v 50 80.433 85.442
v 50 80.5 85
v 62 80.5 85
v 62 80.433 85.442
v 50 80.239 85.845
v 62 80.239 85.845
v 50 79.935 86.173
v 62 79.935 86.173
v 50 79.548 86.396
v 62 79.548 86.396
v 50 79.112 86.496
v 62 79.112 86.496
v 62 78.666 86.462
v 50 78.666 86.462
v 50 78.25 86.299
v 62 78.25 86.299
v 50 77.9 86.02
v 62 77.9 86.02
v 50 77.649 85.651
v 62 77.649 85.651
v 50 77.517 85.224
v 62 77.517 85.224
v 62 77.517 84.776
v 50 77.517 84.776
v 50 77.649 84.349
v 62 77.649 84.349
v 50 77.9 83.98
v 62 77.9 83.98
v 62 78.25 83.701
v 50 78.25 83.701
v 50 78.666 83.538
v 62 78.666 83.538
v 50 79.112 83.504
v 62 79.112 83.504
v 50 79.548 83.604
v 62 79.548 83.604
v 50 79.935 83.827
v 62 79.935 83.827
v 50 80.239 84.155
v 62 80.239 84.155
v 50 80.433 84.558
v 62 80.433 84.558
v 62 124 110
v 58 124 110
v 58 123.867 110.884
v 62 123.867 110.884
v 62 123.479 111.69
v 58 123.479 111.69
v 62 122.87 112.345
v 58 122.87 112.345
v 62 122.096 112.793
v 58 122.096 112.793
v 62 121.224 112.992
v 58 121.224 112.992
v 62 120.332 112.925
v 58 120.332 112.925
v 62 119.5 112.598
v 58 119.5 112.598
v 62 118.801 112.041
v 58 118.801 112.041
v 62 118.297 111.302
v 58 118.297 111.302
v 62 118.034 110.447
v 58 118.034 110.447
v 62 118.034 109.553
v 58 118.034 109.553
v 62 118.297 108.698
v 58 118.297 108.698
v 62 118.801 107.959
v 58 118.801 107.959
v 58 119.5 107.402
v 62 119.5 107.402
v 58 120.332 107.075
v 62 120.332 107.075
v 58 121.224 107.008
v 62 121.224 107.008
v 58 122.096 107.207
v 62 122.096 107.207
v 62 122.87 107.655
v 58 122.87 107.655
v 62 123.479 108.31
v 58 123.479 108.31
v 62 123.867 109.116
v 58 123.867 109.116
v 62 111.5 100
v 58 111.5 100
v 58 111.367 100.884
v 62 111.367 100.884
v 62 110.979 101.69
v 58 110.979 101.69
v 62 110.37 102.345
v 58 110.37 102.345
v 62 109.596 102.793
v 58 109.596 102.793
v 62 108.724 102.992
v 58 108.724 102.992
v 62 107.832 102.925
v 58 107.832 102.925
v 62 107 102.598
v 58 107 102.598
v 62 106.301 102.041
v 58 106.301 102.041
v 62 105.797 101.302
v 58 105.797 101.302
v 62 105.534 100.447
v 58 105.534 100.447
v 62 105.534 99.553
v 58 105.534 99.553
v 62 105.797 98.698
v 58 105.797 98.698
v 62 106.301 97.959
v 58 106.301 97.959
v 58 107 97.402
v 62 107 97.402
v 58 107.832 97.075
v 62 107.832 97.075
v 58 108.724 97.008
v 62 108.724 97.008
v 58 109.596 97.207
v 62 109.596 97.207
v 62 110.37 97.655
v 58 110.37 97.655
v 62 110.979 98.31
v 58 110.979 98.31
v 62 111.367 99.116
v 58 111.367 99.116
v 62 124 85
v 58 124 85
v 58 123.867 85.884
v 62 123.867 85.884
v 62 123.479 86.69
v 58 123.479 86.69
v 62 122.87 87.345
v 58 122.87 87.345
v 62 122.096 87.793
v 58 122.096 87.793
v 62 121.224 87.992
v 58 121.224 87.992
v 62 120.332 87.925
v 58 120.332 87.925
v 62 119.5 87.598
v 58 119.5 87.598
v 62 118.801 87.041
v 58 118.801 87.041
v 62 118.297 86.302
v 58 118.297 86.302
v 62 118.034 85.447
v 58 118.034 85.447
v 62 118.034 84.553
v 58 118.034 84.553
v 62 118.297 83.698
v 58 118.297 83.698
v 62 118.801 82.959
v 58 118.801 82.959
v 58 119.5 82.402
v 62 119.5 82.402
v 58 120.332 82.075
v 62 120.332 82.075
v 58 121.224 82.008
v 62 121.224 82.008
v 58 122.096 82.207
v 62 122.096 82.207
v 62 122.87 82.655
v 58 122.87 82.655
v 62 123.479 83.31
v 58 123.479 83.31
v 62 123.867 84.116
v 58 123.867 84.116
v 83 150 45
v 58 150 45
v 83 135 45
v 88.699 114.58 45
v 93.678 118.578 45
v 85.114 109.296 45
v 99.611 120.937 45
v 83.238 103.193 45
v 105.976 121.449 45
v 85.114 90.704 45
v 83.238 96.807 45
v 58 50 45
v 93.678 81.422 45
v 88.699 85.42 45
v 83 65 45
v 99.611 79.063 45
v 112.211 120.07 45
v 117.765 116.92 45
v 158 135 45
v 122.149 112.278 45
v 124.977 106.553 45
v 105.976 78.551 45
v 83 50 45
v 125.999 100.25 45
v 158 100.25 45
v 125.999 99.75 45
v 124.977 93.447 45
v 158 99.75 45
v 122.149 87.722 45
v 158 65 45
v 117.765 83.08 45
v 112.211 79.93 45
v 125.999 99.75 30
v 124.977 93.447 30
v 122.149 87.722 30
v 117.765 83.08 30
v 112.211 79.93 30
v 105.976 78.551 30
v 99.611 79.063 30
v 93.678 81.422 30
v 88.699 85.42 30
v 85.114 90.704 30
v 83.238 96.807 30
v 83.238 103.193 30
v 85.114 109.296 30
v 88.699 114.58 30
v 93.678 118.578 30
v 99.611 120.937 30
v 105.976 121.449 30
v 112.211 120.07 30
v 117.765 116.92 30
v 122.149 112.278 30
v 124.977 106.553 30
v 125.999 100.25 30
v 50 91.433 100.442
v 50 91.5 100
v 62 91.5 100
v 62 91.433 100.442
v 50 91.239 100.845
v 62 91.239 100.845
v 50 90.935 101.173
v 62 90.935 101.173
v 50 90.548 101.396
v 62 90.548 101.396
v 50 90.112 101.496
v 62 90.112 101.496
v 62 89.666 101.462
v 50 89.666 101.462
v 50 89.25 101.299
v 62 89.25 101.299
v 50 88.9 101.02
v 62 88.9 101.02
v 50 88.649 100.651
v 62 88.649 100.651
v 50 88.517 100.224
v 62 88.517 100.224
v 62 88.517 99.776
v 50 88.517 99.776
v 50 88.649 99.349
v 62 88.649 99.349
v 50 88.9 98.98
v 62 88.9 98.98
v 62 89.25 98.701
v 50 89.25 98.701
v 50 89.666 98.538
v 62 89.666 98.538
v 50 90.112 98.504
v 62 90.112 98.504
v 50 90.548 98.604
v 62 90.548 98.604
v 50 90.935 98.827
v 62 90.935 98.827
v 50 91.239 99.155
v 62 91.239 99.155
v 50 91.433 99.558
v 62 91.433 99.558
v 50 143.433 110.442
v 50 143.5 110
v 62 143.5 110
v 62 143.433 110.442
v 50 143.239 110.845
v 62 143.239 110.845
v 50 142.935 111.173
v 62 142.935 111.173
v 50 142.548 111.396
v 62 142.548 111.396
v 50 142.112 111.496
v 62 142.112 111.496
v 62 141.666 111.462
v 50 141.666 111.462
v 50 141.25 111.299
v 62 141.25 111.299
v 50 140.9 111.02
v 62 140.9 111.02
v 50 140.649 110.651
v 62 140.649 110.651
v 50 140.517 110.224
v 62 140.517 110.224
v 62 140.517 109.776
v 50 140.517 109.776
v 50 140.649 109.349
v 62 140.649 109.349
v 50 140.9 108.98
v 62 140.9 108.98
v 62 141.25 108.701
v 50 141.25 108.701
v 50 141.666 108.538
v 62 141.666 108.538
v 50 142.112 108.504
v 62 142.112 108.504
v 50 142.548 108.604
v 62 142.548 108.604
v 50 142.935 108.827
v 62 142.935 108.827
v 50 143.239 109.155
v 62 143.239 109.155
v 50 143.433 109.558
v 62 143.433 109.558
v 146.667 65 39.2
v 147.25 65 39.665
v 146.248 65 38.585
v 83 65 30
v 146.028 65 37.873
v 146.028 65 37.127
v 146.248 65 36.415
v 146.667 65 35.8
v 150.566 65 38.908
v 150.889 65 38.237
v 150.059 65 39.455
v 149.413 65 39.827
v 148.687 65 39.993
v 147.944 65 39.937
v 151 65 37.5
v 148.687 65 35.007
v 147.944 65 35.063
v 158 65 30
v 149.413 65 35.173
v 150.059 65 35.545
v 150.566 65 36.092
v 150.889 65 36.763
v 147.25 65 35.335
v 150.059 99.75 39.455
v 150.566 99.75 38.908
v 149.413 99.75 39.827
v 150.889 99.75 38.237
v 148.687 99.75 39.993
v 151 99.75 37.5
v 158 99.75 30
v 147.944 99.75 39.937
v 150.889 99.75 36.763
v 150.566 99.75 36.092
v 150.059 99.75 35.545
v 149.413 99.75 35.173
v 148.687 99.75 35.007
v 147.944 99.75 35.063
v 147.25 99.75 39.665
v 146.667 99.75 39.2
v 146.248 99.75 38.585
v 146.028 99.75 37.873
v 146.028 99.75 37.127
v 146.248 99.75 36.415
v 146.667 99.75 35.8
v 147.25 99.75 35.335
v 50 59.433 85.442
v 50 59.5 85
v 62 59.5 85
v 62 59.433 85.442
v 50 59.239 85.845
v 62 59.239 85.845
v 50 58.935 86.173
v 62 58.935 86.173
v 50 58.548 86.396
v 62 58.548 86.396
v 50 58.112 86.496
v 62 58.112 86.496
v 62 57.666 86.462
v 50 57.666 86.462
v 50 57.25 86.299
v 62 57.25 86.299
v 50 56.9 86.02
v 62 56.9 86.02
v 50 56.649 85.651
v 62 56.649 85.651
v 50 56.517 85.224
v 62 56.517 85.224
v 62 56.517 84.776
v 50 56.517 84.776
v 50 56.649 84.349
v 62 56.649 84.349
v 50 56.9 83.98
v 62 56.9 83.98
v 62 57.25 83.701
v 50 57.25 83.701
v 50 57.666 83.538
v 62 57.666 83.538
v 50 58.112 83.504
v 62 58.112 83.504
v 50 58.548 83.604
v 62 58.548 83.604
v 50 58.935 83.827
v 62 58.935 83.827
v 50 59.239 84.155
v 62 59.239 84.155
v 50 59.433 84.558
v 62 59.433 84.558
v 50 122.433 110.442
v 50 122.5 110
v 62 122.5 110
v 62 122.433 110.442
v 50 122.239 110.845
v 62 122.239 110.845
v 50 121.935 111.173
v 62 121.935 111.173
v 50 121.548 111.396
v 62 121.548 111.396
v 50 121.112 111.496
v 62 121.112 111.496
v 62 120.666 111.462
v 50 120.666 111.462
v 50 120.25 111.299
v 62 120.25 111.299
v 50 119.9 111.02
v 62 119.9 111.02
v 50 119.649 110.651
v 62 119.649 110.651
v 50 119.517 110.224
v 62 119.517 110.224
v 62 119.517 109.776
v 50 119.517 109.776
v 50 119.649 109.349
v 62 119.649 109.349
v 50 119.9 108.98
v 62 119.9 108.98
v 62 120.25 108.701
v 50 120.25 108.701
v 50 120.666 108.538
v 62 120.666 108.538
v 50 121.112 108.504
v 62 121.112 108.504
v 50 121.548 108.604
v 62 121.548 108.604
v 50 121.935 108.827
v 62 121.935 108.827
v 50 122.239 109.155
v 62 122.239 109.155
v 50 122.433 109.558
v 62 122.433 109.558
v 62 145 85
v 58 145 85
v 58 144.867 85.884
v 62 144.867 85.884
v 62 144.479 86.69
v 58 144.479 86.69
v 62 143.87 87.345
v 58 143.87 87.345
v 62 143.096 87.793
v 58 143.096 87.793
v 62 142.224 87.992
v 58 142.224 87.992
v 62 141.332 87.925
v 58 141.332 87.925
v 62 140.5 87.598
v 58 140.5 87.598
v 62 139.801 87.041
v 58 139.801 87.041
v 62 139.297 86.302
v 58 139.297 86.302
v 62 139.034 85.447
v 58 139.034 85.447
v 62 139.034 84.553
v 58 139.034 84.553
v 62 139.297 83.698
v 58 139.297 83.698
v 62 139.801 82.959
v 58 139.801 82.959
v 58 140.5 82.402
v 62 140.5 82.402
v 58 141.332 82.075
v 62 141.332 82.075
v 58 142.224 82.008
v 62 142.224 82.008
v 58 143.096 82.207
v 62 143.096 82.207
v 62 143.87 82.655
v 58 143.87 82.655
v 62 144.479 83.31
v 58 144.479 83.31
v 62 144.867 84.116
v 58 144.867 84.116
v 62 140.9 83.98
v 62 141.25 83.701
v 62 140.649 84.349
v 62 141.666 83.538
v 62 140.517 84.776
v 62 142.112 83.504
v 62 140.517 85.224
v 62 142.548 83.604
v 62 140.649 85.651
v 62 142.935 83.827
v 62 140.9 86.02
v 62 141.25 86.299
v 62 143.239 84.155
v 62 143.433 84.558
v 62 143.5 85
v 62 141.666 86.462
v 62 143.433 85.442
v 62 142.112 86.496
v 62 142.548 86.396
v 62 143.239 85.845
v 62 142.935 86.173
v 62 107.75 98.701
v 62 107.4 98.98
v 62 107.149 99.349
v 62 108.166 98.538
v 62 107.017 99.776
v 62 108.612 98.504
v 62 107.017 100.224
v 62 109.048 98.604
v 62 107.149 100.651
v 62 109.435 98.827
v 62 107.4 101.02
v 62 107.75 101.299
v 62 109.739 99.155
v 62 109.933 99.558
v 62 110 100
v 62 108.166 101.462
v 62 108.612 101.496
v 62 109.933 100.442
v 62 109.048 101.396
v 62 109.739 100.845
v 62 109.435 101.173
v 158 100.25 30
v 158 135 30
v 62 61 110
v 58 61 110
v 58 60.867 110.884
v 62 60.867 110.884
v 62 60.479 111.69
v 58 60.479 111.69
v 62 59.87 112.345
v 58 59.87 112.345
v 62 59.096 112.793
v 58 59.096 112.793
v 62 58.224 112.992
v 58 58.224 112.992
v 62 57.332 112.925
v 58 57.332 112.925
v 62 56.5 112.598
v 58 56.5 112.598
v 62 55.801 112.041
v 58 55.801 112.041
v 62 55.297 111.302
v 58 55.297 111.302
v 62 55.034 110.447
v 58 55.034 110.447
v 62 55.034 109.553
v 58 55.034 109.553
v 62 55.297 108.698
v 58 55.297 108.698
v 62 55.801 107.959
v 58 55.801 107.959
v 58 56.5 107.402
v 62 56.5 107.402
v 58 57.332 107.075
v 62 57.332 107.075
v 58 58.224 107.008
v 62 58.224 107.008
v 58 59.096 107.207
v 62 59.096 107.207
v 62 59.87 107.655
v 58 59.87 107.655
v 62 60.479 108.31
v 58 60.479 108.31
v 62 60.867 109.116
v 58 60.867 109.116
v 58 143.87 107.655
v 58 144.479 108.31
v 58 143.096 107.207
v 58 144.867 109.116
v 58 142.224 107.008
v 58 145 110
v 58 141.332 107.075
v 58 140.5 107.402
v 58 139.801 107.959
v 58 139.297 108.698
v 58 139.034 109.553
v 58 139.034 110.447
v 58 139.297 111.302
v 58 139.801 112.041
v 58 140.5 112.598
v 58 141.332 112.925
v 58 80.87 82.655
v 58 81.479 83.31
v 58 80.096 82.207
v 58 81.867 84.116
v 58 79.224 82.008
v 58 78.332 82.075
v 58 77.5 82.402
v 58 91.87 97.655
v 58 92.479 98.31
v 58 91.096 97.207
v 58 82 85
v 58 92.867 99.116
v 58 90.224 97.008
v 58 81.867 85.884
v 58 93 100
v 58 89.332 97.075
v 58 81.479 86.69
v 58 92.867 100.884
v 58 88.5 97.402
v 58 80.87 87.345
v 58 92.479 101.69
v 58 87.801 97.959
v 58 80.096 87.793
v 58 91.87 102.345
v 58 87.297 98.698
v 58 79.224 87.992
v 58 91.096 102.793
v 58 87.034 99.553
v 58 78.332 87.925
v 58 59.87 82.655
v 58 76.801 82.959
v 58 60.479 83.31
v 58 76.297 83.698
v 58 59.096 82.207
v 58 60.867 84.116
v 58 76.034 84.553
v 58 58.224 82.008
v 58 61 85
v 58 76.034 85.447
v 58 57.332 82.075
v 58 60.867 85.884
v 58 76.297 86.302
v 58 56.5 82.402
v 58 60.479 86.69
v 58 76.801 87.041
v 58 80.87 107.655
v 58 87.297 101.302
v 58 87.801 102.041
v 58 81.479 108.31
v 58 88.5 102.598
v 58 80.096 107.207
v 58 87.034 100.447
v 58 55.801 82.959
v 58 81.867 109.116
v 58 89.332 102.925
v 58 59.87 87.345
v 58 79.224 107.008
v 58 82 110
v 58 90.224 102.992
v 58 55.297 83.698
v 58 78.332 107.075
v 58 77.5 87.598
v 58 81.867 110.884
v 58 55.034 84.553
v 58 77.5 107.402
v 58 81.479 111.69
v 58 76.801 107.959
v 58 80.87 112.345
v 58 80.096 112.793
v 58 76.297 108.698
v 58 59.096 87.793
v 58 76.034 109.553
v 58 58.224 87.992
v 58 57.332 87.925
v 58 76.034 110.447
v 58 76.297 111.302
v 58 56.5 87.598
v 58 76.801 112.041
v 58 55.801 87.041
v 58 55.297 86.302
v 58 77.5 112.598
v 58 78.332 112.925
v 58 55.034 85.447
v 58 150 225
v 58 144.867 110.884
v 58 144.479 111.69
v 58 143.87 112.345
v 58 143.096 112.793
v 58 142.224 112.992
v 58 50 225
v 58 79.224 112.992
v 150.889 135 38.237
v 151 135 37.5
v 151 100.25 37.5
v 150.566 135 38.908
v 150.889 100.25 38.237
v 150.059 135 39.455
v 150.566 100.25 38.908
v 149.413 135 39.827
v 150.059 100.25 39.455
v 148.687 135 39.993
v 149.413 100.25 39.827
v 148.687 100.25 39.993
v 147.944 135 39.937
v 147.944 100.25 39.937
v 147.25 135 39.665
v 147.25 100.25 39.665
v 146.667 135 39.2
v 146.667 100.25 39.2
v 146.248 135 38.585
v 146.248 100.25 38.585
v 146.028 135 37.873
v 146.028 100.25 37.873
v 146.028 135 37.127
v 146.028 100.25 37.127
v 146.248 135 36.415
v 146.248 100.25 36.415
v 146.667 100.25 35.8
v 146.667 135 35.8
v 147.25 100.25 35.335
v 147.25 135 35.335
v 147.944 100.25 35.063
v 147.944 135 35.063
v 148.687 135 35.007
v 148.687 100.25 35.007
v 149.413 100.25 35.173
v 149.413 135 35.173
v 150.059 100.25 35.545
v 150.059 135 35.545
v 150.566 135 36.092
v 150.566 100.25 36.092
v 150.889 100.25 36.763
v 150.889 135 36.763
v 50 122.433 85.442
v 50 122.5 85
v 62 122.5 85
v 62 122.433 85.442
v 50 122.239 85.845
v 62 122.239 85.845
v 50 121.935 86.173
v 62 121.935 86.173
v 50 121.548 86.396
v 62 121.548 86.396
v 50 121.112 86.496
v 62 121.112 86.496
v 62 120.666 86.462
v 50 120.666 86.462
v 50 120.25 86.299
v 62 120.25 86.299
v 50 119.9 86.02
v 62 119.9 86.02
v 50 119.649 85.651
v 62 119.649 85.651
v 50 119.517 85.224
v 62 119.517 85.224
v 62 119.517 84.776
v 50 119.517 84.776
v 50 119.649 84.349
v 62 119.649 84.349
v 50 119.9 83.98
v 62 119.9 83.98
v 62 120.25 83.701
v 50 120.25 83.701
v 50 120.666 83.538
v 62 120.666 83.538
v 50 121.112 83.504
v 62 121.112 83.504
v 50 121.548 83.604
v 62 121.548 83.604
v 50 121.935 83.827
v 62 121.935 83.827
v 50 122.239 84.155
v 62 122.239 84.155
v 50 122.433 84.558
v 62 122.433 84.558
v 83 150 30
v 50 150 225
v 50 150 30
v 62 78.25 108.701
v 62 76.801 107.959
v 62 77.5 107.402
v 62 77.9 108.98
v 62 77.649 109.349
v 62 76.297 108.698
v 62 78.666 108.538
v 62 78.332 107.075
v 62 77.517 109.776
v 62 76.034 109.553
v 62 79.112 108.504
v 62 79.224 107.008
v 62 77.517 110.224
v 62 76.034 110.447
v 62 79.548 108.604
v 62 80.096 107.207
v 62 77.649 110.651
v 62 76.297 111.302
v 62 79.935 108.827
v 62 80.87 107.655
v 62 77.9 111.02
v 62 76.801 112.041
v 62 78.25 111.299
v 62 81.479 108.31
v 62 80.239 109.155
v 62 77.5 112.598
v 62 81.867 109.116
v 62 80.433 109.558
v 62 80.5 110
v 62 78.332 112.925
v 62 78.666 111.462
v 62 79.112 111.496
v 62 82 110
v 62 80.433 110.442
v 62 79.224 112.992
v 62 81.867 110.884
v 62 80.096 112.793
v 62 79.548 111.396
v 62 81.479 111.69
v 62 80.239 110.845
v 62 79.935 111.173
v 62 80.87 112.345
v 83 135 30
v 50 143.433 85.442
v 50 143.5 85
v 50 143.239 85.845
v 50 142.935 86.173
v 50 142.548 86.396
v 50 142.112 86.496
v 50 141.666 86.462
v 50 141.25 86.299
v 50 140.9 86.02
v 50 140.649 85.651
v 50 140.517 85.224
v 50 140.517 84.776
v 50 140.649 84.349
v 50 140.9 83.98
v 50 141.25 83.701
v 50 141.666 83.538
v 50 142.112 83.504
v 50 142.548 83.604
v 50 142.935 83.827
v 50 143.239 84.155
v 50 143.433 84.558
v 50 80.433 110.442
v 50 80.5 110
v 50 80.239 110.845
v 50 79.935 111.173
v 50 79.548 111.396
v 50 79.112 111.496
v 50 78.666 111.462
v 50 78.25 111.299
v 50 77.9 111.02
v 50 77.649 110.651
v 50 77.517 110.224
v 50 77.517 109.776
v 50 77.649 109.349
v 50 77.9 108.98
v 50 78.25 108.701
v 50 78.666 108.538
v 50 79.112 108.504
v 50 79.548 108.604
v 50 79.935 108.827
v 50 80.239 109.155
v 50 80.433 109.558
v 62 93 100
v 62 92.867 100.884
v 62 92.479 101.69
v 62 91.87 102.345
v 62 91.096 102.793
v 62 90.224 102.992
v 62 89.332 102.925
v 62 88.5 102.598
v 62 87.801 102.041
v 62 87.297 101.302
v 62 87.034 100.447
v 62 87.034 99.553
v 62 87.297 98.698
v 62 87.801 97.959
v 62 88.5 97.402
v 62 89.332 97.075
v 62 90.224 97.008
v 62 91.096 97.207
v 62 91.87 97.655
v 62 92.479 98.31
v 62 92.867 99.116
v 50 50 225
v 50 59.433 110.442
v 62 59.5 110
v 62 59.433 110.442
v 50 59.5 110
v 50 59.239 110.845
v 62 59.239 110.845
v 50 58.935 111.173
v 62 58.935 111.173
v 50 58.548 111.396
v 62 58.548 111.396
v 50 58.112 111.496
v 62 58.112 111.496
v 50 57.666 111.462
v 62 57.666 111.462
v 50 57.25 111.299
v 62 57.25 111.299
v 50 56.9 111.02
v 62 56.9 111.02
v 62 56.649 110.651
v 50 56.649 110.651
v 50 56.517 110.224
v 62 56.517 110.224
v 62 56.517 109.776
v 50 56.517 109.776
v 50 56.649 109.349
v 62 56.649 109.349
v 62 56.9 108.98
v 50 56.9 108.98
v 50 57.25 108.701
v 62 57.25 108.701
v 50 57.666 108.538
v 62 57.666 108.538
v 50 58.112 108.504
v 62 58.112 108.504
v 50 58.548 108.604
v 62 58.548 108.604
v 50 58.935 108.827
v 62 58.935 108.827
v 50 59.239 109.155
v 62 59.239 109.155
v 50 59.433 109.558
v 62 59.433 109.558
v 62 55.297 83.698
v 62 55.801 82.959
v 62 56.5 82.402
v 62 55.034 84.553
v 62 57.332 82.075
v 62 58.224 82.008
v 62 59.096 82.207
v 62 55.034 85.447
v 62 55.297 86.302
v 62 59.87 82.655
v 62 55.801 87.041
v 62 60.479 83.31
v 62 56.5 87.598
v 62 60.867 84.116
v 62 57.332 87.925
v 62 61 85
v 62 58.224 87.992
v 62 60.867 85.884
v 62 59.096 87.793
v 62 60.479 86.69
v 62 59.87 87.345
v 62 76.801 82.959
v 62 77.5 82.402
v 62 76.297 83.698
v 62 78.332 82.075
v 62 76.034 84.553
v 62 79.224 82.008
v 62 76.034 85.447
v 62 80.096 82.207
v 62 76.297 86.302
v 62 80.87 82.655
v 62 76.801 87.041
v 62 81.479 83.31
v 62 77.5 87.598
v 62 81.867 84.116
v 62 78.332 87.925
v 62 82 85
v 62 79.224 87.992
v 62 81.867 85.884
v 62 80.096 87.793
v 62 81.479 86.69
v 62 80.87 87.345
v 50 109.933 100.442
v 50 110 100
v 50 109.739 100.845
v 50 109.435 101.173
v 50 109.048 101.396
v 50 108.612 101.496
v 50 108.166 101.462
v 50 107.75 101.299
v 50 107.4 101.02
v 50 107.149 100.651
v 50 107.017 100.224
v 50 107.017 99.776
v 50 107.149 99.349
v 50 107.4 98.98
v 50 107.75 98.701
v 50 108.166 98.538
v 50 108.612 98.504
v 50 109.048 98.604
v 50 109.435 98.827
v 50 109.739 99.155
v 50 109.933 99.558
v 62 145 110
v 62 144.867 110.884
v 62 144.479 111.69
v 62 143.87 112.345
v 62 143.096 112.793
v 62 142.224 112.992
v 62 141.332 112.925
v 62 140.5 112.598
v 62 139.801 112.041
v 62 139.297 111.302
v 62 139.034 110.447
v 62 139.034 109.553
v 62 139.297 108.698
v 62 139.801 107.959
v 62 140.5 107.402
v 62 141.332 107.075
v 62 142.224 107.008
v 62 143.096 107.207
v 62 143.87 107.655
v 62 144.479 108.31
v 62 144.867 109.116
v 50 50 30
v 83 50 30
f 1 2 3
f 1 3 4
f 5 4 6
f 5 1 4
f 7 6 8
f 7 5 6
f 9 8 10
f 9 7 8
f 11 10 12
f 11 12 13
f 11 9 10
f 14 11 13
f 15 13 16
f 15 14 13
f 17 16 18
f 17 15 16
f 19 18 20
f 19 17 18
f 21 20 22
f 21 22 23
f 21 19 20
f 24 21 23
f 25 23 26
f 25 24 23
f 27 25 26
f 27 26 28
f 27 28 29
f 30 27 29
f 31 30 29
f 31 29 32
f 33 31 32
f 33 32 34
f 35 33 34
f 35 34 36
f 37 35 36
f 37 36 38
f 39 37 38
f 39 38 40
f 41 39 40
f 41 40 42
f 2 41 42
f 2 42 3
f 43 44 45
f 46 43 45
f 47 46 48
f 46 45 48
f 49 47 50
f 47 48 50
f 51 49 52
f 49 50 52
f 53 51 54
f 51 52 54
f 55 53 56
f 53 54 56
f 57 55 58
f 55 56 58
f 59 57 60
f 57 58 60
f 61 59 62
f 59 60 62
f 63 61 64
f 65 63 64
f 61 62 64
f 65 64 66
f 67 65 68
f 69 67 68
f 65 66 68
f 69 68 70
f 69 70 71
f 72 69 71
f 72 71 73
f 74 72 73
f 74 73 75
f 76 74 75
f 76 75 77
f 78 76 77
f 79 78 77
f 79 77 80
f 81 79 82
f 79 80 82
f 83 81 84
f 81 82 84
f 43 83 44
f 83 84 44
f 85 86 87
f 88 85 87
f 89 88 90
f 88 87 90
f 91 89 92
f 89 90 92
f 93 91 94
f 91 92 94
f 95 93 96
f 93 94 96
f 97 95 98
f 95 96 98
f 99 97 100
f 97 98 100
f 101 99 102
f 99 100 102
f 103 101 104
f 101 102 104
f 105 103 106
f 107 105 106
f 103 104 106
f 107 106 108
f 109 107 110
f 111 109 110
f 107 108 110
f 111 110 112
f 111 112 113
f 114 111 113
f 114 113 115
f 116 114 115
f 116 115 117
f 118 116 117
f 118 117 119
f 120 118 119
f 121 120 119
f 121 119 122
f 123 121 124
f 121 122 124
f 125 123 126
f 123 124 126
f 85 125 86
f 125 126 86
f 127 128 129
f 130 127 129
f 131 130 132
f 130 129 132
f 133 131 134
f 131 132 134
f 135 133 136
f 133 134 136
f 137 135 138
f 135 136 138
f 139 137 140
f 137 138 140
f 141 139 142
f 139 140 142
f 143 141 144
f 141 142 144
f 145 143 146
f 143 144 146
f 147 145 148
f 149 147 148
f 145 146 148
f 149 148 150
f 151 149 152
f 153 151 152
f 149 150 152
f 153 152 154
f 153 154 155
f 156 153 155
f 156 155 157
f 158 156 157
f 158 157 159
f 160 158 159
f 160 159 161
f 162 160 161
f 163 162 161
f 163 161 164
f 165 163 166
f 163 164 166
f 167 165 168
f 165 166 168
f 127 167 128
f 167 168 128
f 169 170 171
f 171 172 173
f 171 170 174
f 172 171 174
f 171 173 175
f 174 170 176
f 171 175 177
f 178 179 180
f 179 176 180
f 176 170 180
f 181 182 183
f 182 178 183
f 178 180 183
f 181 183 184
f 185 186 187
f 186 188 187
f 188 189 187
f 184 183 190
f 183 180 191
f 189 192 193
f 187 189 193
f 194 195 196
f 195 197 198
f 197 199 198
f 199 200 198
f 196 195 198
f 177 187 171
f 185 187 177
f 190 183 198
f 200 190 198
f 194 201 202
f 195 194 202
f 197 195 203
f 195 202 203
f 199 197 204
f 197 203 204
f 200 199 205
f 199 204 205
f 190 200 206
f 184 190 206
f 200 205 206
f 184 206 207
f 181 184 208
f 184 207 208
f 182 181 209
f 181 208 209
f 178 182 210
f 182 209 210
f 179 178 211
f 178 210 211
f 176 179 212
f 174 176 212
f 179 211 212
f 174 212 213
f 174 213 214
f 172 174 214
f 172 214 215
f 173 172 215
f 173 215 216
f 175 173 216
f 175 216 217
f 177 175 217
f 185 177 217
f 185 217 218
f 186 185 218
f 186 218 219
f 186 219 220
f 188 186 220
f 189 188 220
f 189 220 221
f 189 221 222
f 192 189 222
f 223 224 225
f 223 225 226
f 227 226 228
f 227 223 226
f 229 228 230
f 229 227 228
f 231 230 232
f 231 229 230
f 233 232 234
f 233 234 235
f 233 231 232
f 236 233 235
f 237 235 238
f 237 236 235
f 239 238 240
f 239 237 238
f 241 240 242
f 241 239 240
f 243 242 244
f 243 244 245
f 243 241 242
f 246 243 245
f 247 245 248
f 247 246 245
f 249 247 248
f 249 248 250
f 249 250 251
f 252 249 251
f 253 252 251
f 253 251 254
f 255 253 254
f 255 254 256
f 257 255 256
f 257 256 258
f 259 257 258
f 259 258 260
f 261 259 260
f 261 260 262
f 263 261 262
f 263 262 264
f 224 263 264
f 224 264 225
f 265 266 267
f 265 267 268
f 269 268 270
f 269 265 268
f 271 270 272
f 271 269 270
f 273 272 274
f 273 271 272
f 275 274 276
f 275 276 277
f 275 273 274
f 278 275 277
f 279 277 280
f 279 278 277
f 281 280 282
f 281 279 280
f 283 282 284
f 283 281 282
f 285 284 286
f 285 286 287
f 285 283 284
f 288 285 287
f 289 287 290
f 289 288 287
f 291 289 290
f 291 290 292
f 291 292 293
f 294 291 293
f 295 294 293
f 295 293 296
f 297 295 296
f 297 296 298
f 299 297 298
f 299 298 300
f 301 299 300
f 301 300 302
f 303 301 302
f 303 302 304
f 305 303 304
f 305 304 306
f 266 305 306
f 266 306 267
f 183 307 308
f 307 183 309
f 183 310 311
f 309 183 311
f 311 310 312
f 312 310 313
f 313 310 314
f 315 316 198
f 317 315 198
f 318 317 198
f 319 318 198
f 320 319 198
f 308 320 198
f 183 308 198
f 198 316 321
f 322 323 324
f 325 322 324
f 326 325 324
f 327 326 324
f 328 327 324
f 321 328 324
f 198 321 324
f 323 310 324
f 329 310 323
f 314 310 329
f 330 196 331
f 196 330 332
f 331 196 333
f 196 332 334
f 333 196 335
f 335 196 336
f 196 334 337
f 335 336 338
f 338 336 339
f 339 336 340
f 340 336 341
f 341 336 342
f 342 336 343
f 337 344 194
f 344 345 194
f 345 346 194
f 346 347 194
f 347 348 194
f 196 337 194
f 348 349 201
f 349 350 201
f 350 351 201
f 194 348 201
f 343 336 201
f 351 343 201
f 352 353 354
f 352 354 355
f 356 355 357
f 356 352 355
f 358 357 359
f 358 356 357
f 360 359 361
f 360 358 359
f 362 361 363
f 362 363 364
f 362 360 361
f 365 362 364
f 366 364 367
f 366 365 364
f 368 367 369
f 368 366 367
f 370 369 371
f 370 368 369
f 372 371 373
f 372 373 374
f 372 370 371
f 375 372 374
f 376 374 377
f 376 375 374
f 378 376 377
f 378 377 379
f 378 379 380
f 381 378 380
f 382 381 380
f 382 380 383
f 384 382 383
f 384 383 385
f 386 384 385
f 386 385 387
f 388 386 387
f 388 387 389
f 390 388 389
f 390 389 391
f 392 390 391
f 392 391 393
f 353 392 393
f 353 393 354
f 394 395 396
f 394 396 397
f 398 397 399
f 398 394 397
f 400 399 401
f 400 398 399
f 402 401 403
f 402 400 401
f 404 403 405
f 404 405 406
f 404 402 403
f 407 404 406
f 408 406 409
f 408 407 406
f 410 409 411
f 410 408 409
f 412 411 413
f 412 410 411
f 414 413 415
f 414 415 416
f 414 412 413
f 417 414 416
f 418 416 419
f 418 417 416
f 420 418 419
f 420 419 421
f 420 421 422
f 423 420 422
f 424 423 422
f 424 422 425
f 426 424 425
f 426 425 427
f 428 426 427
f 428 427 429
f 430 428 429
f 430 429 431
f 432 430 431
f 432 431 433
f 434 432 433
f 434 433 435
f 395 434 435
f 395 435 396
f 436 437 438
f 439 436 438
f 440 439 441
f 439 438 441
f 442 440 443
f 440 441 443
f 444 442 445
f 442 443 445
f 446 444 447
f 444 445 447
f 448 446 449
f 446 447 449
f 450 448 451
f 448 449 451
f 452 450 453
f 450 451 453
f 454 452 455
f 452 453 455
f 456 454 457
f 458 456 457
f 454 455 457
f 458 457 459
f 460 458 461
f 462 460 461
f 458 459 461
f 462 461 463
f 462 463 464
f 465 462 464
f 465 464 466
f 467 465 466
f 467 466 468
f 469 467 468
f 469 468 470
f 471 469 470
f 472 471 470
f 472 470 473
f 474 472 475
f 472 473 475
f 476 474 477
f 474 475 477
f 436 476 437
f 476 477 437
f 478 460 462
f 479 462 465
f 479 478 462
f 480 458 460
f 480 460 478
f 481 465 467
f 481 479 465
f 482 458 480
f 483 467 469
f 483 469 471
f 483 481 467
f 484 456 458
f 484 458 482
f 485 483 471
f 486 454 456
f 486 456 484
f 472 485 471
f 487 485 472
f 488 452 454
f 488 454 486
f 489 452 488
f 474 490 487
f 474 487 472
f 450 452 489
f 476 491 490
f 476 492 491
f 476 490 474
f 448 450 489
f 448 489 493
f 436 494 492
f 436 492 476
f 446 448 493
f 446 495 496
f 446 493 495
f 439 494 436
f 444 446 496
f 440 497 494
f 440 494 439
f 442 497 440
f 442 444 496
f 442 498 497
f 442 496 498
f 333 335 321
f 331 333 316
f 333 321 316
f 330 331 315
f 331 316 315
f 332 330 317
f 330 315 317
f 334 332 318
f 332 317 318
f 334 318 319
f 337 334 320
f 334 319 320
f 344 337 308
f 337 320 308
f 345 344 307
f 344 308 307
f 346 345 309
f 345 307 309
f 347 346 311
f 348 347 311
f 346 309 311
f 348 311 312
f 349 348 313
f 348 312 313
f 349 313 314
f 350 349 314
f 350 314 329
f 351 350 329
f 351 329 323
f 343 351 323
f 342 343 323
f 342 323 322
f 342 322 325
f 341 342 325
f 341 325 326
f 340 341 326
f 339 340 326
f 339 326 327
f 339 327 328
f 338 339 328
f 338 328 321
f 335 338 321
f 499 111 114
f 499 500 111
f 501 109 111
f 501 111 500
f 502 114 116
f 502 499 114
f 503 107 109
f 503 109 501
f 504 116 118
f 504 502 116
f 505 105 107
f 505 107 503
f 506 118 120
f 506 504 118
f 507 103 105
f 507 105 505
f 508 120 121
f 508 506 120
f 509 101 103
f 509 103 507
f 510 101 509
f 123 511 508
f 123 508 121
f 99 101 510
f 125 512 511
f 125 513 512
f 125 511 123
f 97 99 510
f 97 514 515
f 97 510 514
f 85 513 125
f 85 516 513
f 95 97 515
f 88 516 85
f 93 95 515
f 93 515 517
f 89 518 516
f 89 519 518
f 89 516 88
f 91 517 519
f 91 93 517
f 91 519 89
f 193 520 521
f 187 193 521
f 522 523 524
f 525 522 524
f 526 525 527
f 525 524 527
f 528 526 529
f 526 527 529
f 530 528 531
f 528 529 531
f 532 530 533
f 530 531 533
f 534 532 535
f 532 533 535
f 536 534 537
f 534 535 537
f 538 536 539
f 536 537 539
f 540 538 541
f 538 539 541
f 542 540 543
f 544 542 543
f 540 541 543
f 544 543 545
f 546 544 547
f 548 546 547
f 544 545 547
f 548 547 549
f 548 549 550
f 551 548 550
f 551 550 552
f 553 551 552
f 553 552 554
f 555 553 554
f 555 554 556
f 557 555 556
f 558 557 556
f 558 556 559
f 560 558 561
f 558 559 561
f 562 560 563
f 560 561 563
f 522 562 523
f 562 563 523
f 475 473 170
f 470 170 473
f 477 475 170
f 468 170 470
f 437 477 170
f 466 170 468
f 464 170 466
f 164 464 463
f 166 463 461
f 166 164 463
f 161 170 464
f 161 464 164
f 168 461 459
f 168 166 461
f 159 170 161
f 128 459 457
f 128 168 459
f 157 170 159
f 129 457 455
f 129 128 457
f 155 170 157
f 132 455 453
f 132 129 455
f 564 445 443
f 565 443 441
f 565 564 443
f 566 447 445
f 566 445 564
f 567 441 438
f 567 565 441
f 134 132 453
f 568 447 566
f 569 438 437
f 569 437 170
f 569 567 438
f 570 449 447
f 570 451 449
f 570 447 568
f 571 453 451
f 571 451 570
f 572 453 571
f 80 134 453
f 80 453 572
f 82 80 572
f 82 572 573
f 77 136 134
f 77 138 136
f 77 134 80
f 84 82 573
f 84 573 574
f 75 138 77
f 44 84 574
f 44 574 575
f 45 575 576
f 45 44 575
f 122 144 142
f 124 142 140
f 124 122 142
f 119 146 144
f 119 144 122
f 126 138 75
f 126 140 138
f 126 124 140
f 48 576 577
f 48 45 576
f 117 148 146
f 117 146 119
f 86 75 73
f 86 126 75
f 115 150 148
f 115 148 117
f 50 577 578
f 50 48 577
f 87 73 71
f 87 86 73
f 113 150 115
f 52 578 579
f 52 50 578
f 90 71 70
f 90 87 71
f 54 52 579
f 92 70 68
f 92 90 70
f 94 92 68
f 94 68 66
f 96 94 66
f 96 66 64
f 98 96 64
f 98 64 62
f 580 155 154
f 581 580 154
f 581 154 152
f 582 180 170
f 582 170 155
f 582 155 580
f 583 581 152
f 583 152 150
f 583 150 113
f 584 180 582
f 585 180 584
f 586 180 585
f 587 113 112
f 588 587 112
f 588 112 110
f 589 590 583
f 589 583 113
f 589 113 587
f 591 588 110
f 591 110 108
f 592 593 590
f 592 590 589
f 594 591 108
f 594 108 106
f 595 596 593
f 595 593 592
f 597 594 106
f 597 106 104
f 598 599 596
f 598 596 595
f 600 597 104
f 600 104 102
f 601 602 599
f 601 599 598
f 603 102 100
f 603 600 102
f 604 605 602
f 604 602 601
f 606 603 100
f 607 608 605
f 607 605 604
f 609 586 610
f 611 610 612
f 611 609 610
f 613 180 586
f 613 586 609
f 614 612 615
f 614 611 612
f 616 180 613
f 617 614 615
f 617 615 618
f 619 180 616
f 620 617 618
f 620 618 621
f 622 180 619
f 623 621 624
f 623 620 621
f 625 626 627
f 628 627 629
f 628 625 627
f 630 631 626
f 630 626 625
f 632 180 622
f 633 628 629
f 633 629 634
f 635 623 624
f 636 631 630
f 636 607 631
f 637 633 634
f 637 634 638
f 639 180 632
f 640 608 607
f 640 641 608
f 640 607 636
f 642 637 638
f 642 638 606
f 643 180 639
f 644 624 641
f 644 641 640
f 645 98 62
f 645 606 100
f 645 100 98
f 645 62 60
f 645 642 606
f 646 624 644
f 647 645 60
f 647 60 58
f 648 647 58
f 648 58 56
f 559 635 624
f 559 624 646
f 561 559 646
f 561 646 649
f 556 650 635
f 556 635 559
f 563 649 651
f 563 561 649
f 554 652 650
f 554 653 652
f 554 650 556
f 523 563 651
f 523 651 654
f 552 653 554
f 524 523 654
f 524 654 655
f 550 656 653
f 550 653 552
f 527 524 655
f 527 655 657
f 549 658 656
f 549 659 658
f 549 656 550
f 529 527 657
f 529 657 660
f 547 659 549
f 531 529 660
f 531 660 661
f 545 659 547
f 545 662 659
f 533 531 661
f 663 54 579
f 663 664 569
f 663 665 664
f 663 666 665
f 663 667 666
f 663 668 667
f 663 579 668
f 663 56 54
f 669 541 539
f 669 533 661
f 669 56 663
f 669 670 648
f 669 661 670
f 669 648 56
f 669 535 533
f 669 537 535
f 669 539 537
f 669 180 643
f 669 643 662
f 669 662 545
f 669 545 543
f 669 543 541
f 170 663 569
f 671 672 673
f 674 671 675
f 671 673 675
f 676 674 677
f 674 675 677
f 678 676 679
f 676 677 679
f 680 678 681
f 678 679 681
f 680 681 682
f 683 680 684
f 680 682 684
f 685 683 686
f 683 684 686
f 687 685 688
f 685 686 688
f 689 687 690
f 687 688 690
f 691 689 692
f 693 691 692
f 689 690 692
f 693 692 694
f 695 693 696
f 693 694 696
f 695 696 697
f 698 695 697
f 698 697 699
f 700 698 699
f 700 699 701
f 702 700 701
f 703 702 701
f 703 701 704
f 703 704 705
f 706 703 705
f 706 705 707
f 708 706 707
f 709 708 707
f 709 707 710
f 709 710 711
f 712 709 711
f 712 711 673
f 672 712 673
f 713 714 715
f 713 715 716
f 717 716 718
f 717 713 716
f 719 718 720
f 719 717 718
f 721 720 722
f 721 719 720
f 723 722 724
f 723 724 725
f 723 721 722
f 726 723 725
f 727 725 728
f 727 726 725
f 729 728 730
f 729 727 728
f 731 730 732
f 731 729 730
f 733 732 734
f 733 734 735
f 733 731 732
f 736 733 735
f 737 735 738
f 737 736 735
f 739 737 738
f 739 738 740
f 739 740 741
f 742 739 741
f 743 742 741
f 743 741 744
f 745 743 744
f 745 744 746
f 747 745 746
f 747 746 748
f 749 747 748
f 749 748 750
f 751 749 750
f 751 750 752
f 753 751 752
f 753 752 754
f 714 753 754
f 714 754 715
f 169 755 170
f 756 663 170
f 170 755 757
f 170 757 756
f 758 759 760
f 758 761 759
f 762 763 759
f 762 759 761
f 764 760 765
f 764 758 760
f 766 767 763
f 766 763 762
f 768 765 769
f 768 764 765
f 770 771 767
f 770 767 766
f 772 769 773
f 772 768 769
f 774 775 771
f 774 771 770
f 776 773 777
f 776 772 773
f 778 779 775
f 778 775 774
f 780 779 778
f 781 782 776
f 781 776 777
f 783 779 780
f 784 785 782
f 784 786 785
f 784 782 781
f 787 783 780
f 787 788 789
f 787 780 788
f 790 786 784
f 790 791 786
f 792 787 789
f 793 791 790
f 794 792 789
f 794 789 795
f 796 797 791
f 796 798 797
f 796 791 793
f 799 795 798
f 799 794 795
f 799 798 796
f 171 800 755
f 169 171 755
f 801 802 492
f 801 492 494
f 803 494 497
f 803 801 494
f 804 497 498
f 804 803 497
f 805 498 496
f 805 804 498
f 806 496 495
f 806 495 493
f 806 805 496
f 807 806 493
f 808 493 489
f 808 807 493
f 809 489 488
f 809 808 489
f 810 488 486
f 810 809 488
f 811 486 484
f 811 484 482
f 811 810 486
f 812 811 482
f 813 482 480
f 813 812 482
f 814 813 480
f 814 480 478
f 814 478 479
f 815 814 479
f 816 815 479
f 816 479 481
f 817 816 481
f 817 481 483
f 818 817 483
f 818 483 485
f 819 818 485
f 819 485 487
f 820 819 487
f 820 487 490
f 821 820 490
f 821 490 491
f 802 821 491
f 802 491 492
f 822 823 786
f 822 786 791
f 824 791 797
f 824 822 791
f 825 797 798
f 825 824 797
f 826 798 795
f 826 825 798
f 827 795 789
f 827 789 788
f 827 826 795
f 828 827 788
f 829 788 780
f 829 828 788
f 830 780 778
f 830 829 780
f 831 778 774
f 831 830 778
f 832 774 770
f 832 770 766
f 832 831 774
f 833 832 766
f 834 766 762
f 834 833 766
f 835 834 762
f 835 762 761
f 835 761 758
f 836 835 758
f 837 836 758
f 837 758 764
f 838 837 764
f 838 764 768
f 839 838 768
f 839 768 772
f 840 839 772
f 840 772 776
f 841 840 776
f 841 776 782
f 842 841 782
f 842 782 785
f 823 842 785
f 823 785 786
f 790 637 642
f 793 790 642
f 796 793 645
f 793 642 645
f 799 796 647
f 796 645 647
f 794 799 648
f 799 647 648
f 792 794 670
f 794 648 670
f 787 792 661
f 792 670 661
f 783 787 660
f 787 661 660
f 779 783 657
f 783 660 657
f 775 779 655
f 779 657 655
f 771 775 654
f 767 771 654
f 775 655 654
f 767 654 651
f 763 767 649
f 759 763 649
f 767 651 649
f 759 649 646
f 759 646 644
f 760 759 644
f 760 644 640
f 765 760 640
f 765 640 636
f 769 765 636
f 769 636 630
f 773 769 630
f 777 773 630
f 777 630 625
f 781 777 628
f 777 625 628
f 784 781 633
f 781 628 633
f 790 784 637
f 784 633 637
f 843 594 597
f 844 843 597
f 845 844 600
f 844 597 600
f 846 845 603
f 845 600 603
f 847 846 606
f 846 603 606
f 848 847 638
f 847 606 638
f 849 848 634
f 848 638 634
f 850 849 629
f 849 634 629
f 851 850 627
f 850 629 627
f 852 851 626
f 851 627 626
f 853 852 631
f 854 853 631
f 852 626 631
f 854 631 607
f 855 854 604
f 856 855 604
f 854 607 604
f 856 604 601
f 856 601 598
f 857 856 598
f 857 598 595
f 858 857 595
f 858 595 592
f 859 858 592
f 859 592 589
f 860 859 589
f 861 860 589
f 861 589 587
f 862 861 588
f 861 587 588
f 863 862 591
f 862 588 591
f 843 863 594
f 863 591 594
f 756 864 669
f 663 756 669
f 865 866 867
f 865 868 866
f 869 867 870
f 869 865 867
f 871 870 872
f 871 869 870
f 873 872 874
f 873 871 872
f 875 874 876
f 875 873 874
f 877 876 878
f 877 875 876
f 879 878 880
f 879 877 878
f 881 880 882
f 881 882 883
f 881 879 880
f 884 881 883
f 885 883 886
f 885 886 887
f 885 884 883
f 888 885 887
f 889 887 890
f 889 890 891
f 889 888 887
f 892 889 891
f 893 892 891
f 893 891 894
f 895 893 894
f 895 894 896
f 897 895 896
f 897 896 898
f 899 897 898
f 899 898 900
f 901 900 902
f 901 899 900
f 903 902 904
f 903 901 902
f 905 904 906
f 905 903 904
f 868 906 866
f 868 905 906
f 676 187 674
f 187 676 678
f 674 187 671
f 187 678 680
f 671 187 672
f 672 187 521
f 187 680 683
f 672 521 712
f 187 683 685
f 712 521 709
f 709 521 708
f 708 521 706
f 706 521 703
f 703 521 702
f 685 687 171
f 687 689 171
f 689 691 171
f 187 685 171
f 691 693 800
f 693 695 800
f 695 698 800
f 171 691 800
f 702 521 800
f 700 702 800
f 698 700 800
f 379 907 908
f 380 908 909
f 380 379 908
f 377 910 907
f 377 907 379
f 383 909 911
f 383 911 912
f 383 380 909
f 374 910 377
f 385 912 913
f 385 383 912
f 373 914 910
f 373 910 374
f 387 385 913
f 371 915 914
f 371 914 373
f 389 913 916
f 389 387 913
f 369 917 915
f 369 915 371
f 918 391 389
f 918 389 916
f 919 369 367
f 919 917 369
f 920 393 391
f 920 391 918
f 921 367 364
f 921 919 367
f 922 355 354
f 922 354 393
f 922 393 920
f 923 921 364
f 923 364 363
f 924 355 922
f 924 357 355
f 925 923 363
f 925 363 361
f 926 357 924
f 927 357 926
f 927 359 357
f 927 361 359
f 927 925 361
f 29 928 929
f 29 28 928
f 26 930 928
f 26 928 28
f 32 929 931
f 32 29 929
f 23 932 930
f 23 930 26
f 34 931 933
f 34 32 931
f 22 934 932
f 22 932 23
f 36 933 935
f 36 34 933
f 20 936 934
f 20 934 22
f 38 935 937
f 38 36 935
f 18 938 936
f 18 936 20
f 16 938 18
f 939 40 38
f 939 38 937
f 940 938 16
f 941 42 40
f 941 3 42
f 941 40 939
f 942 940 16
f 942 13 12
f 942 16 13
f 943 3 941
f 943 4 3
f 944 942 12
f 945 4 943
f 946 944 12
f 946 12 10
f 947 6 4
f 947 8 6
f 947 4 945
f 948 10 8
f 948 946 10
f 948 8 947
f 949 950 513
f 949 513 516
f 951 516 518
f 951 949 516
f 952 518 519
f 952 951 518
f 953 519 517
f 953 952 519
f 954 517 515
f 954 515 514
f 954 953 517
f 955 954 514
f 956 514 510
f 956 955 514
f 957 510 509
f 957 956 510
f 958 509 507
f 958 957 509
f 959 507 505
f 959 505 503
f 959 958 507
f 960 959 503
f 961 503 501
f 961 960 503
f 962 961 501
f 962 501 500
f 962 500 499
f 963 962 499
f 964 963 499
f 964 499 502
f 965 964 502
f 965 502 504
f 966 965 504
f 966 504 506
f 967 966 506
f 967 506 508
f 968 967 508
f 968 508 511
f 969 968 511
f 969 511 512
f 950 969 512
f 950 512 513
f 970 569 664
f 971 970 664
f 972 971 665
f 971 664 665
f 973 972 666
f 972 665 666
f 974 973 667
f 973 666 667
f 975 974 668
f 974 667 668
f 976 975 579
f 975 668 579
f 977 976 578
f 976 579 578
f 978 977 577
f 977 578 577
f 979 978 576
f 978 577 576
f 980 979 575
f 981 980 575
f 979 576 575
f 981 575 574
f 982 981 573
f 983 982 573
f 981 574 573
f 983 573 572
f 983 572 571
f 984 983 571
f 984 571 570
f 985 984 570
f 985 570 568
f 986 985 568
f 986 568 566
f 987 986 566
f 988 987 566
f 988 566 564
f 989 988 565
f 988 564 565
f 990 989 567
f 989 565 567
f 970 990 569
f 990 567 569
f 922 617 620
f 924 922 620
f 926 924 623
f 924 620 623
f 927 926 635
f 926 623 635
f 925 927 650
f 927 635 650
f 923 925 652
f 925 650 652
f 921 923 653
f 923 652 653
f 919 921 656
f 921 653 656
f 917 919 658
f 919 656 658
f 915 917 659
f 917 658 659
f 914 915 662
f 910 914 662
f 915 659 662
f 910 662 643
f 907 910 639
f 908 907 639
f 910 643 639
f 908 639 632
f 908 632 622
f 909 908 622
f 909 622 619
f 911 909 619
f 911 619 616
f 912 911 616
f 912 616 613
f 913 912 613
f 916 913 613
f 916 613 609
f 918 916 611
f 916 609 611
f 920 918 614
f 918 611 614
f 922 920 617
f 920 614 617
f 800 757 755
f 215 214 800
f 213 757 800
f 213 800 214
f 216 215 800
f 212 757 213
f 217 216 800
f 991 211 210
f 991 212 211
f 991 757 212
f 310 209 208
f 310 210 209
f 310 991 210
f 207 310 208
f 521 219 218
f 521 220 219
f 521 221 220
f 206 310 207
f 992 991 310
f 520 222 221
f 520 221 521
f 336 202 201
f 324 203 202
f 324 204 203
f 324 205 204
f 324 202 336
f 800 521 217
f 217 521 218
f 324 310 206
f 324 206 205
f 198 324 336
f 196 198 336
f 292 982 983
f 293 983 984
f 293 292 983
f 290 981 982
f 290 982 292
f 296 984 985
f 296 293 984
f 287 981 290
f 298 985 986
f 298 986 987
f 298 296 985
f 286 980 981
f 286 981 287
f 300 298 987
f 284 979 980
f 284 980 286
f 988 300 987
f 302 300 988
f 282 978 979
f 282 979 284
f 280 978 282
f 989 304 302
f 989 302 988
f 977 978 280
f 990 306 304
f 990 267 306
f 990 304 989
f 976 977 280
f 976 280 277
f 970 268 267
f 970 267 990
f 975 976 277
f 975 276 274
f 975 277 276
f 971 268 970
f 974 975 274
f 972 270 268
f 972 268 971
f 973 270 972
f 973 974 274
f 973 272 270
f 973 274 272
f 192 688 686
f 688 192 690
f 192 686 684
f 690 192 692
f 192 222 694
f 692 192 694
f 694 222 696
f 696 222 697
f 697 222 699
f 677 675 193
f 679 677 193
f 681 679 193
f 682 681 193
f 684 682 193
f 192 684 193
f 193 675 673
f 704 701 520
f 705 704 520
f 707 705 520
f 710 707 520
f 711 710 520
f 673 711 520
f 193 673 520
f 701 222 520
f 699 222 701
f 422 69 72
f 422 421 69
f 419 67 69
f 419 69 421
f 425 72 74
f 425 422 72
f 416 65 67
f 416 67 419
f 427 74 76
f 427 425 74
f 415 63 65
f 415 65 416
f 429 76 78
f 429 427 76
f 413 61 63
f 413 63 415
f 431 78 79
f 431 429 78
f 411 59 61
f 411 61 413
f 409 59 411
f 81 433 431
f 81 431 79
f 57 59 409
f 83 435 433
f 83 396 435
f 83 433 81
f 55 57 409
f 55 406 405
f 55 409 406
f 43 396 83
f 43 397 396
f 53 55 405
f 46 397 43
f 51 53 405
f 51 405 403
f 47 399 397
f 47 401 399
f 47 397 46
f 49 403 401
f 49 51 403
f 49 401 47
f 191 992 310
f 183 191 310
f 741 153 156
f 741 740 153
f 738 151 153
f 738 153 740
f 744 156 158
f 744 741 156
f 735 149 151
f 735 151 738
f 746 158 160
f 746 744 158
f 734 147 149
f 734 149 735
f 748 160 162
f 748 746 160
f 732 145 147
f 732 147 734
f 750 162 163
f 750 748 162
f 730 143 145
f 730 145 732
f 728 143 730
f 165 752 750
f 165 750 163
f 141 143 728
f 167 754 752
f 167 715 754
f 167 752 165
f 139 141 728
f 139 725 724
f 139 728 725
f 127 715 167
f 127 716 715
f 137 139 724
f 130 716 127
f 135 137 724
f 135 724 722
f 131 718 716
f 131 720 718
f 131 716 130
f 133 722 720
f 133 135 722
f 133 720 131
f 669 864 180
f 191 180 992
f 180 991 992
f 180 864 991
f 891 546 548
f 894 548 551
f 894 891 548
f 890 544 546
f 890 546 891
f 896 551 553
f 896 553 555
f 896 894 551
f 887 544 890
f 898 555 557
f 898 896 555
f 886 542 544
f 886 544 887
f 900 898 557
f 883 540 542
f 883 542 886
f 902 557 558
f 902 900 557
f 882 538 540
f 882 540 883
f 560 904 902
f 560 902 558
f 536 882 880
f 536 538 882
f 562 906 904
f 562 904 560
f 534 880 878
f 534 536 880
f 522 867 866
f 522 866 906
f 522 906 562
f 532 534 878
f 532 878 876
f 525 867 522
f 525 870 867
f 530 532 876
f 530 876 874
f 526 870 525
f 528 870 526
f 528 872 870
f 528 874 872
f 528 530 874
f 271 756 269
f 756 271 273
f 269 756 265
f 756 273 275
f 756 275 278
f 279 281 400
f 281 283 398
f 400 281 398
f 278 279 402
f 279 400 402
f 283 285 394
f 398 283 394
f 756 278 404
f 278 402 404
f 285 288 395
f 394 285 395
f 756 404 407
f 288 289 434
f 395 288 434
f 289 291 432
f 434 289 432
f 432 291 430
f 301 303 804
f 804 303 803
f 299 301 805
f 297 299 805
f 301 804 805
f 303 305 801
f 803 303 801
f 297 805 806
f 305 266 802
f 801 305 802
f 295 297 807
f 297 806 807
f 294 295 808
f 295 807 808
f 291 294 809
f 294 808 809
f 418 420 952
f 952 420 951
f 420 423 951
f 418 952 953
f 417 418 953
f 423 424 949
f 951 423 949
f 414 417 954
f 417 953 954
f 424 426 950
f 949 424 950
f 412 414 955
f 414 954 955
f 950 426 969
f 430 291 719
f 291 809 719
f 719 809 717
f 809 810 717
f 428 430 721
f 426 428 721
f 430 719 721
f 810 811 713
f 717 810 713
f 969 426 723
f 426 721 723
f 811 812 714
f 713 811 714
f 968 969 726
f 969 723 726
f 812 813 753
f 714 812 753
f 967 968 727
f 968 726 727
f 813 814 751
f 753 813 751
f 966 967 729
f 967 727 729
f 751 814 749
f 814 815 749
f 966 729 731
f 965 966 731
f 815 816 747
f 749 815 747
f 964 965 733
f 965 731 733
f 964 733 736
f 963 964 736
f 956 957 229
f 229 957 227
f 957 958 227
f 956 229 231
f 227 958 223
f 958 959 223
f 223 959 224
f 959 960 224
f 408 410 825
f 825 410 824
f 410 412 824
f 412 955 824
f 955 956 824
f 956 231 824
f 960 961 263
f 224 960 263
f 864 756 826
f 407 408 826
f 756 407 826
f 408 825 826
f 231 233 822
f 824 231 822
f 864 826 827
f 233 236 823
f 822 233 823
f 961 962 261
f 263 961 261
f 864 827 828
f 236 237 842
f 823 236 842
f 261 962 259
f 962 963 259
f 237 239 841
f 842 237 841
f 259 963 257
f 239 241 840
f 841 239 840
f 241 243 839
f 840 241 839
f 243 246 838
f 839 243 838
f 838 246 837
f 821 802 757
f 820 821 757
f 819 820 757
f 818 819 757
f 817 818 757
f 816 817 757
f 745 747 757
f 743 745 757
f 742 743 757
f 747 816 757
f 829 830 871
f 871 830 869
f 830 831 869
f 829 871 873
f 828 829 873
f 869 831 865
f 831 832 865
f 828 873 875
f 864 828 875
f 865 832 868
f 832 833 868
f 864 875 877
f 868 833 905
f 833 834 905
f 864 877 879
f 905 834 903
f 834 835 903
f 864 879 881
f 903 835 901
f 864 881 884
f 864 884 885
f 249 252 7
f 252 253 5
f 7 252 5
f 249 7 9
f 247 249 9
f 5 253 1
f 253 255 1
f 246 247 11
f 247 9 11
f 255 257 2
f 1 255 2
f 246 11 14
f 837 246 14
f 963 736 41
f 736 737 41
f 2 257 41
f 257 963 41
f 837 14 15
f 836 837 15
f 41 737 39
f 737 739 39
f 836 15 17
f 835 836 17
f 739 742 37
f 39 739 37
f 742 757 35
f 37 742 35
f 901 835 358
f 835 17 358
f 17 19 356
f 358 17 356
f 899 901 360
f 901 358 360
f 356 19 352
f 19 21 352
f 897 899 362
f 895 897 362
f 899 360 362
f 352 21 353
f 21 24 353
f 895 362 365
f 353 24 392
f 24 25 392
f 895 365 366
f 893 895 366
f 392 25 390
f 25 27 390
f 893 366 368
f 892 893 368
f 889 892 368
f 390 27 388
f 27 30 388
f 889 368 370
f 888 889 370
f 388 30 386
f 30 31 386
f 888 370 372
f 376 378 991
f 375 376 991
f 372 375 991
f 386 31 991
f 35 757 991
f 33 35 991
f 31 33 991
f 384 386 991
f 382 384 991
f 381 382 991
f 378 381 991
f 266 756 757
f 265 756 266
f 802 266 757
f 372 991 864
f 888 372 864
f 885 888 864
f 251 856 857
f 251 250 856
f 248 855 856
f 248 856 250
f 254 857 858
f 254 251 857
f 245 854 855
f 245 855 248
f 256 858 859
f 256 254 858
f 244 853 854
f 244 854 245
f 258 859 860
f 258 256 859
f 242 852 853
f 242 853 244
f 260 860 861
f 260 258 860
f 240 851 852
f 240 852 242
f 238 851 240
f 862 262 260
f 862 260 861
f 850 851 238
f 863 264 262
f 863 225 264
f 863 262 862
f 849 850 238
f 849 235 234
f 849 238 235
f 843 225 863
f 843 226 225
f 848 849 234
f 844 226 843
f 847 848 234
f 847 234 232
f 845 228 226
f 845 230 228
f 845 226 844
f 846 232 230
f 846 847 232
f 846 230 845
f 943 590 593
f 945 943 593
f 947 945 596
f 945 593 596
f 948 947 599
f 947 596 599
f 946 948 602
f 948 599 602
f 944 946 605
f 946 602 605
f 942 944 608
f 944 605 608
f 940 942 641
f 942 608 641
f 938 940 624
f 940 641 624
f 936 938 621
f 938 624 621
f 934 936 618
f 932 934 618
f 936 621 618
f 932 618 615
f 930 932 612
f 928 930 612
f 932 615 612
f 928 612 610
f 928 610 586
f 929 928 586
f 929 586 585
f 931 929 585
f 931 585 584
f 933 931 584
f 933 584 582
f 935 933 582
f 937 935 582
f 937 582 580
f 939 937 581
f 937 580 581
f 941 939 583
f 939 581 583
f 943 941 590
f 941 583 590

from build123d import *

# Parameters (mm, degrees)
F3_DEPTH = 230
F2_W     = 108
F2_H     = 30
F2_W_2   = 100
F2_H_2   = 180
F4_DEPTH = 310
F6_START = 35
F5_R     = 1.5
F6_DEPTH = 36
F7_START = 58
F5_R_2   = 3
F7_DEPTH = 4
F8_START = -44
F2_R     = 2.5
F8_DEPTH = 98


with BuildPart() as f3:
    # F1 (on Top) → F3 (new body)
    with BuildSketch(Plane.XY):
        with BuildLine():
            Line((83, 150), (50, 150))
            Line((50, 150), (50, 50))
            Line((50, 50), (83, 50))
            Line((83, 50), (83, 65))
            Line((83, 65), (158, 65))
            Line((158, 65), (158, 99.75))
            Line((158, 99.75), (126, 99.75))
            Line((126, 99.75), (125.9985464625, 99.75))
            ThreePointArc((125.9985464625, 99.75), (83, 100), (125.9985464625, 100.25))
            Line((125.9985464625, 100.25), (126, 100.25))
            Line((126, 100.25), (158, 100.25))
            Line((158, 100.25), (158, 135))
            Line((158, 135), (83, 135))
            Line((83, 135), (83, 150))
        make_face()
    extrude(amount=F3_DEPTH)

    # F2 (on Front) → F4 (cut)
    with BuildSketch(Plane.XZ):
        with Locations((104, 15)):
            Rectangle(F2_W, F2_H)
        with Locations((108, 135)):
            Rectangle(F2_W_2, F2_H_2)
        Polygon((50, 295), (50, 225), (58, 225), (158, 225), (158, 295), align=None)
    extrude(amount=-F4_DEPTH, mode=Mode.SUBTRACT)

    # F5 (on Right) → F6 (cut)
    with BuildSketch(Plane.YZ.offset(F6_START)):
        with Locations((142, 85)):
            Circle(F5_R)
        with Locations((142, 110)):
            Circle(F5_R)
        with Locations((121, 110)):
            Circle(F5_R)
        with Locations((108.5, 100)):
            Circle(F5_R)
        with Locations((121, 85)):
            Circle(F5_R)
        with Locations((90, 100)):
            Circle(F5_R)
        with Locations((79, 85)):
            Circle(F5_R)
        with Locations((58, 110)):
            Circle(F5_R)
        with Locations((79, 110)):
            Circle(F5_R)
        with Locations((58, 85)):
            Circle(F5_R)
    extrude(amount=F6_DEPTH, mode=Mode.SUBTRACT)

    # F5 (on Right) → F7 (join)
    with BuildSketch(Plane.YZ.offset(F7_START)):
        with Locations((58, 110)):
            Circle(F5_R_2)
        with Locations((58, 110)):
            Circle(F5_R, mode=Mode.SUBTRACT)
        with Locations((79, 110)):
            Circle(F5_R_2)
        with Locations((79, 110)):
            Circle(F5_R, mode=Mode.SUBTRACT)
        with Locations((90, 100)):
            Circle(F5_R_2)
        with Locations((90, 100)):
            Circle(F5_R, mode=Mode.SUBTRACT)
        with Locations((108.5, 100)):
            Circle(F5_R_2)
        with Locations((108.5, 100)):
            Circle(F5_R, mode=Mode.SUBTRACT)
        with Locations((121, 110)):
            Circle(F5_R_2)
        with Locations((121, 110)):
            Circle(F5_R, mode=Mode.SUBTRACT)
        with Locations((142, 110)):
            Circle(F5_R_2)
        with Locations((142, 110)):
            Circle(F5_R, mode=Mode.SUBTRACT)
        with Locations((121, 85)):
            Circle(F5_R_2)
        with Locations((121, 85)):
            Circle(F5_R, mode=Mode.SUBTRACT)
        with Locations((142, 85)):
            Circle(F5_R_2)
        with Locations((142, 85)):
            Circle(F5_R, mode=Mode.SUBTRACT)
        with Locations((79, 85)):
            Circle(F5_R_2)
        with Locations((79, 85)):
            Circle(F5_R, mode=Mode.SUBTRACT)
        with Locations((58, 85)):
            Circle(F5_R_2)
        with Locations((58, 85)):
            Circle(F5_R, mode=Mode.SUBTRACT)
    extrude(amount=F7_DEPTH)

    # F2 (on Front) → F8 (cut)
    with BuildSketch(Plane.XZ.offset(F8_START)):
        with Locations((148.5, 37.5)):
            Circle(F2_R)
    extrude(amount=-F8_DEPTH, mode=Mode.SUBTRACT)


solid = f3.part
